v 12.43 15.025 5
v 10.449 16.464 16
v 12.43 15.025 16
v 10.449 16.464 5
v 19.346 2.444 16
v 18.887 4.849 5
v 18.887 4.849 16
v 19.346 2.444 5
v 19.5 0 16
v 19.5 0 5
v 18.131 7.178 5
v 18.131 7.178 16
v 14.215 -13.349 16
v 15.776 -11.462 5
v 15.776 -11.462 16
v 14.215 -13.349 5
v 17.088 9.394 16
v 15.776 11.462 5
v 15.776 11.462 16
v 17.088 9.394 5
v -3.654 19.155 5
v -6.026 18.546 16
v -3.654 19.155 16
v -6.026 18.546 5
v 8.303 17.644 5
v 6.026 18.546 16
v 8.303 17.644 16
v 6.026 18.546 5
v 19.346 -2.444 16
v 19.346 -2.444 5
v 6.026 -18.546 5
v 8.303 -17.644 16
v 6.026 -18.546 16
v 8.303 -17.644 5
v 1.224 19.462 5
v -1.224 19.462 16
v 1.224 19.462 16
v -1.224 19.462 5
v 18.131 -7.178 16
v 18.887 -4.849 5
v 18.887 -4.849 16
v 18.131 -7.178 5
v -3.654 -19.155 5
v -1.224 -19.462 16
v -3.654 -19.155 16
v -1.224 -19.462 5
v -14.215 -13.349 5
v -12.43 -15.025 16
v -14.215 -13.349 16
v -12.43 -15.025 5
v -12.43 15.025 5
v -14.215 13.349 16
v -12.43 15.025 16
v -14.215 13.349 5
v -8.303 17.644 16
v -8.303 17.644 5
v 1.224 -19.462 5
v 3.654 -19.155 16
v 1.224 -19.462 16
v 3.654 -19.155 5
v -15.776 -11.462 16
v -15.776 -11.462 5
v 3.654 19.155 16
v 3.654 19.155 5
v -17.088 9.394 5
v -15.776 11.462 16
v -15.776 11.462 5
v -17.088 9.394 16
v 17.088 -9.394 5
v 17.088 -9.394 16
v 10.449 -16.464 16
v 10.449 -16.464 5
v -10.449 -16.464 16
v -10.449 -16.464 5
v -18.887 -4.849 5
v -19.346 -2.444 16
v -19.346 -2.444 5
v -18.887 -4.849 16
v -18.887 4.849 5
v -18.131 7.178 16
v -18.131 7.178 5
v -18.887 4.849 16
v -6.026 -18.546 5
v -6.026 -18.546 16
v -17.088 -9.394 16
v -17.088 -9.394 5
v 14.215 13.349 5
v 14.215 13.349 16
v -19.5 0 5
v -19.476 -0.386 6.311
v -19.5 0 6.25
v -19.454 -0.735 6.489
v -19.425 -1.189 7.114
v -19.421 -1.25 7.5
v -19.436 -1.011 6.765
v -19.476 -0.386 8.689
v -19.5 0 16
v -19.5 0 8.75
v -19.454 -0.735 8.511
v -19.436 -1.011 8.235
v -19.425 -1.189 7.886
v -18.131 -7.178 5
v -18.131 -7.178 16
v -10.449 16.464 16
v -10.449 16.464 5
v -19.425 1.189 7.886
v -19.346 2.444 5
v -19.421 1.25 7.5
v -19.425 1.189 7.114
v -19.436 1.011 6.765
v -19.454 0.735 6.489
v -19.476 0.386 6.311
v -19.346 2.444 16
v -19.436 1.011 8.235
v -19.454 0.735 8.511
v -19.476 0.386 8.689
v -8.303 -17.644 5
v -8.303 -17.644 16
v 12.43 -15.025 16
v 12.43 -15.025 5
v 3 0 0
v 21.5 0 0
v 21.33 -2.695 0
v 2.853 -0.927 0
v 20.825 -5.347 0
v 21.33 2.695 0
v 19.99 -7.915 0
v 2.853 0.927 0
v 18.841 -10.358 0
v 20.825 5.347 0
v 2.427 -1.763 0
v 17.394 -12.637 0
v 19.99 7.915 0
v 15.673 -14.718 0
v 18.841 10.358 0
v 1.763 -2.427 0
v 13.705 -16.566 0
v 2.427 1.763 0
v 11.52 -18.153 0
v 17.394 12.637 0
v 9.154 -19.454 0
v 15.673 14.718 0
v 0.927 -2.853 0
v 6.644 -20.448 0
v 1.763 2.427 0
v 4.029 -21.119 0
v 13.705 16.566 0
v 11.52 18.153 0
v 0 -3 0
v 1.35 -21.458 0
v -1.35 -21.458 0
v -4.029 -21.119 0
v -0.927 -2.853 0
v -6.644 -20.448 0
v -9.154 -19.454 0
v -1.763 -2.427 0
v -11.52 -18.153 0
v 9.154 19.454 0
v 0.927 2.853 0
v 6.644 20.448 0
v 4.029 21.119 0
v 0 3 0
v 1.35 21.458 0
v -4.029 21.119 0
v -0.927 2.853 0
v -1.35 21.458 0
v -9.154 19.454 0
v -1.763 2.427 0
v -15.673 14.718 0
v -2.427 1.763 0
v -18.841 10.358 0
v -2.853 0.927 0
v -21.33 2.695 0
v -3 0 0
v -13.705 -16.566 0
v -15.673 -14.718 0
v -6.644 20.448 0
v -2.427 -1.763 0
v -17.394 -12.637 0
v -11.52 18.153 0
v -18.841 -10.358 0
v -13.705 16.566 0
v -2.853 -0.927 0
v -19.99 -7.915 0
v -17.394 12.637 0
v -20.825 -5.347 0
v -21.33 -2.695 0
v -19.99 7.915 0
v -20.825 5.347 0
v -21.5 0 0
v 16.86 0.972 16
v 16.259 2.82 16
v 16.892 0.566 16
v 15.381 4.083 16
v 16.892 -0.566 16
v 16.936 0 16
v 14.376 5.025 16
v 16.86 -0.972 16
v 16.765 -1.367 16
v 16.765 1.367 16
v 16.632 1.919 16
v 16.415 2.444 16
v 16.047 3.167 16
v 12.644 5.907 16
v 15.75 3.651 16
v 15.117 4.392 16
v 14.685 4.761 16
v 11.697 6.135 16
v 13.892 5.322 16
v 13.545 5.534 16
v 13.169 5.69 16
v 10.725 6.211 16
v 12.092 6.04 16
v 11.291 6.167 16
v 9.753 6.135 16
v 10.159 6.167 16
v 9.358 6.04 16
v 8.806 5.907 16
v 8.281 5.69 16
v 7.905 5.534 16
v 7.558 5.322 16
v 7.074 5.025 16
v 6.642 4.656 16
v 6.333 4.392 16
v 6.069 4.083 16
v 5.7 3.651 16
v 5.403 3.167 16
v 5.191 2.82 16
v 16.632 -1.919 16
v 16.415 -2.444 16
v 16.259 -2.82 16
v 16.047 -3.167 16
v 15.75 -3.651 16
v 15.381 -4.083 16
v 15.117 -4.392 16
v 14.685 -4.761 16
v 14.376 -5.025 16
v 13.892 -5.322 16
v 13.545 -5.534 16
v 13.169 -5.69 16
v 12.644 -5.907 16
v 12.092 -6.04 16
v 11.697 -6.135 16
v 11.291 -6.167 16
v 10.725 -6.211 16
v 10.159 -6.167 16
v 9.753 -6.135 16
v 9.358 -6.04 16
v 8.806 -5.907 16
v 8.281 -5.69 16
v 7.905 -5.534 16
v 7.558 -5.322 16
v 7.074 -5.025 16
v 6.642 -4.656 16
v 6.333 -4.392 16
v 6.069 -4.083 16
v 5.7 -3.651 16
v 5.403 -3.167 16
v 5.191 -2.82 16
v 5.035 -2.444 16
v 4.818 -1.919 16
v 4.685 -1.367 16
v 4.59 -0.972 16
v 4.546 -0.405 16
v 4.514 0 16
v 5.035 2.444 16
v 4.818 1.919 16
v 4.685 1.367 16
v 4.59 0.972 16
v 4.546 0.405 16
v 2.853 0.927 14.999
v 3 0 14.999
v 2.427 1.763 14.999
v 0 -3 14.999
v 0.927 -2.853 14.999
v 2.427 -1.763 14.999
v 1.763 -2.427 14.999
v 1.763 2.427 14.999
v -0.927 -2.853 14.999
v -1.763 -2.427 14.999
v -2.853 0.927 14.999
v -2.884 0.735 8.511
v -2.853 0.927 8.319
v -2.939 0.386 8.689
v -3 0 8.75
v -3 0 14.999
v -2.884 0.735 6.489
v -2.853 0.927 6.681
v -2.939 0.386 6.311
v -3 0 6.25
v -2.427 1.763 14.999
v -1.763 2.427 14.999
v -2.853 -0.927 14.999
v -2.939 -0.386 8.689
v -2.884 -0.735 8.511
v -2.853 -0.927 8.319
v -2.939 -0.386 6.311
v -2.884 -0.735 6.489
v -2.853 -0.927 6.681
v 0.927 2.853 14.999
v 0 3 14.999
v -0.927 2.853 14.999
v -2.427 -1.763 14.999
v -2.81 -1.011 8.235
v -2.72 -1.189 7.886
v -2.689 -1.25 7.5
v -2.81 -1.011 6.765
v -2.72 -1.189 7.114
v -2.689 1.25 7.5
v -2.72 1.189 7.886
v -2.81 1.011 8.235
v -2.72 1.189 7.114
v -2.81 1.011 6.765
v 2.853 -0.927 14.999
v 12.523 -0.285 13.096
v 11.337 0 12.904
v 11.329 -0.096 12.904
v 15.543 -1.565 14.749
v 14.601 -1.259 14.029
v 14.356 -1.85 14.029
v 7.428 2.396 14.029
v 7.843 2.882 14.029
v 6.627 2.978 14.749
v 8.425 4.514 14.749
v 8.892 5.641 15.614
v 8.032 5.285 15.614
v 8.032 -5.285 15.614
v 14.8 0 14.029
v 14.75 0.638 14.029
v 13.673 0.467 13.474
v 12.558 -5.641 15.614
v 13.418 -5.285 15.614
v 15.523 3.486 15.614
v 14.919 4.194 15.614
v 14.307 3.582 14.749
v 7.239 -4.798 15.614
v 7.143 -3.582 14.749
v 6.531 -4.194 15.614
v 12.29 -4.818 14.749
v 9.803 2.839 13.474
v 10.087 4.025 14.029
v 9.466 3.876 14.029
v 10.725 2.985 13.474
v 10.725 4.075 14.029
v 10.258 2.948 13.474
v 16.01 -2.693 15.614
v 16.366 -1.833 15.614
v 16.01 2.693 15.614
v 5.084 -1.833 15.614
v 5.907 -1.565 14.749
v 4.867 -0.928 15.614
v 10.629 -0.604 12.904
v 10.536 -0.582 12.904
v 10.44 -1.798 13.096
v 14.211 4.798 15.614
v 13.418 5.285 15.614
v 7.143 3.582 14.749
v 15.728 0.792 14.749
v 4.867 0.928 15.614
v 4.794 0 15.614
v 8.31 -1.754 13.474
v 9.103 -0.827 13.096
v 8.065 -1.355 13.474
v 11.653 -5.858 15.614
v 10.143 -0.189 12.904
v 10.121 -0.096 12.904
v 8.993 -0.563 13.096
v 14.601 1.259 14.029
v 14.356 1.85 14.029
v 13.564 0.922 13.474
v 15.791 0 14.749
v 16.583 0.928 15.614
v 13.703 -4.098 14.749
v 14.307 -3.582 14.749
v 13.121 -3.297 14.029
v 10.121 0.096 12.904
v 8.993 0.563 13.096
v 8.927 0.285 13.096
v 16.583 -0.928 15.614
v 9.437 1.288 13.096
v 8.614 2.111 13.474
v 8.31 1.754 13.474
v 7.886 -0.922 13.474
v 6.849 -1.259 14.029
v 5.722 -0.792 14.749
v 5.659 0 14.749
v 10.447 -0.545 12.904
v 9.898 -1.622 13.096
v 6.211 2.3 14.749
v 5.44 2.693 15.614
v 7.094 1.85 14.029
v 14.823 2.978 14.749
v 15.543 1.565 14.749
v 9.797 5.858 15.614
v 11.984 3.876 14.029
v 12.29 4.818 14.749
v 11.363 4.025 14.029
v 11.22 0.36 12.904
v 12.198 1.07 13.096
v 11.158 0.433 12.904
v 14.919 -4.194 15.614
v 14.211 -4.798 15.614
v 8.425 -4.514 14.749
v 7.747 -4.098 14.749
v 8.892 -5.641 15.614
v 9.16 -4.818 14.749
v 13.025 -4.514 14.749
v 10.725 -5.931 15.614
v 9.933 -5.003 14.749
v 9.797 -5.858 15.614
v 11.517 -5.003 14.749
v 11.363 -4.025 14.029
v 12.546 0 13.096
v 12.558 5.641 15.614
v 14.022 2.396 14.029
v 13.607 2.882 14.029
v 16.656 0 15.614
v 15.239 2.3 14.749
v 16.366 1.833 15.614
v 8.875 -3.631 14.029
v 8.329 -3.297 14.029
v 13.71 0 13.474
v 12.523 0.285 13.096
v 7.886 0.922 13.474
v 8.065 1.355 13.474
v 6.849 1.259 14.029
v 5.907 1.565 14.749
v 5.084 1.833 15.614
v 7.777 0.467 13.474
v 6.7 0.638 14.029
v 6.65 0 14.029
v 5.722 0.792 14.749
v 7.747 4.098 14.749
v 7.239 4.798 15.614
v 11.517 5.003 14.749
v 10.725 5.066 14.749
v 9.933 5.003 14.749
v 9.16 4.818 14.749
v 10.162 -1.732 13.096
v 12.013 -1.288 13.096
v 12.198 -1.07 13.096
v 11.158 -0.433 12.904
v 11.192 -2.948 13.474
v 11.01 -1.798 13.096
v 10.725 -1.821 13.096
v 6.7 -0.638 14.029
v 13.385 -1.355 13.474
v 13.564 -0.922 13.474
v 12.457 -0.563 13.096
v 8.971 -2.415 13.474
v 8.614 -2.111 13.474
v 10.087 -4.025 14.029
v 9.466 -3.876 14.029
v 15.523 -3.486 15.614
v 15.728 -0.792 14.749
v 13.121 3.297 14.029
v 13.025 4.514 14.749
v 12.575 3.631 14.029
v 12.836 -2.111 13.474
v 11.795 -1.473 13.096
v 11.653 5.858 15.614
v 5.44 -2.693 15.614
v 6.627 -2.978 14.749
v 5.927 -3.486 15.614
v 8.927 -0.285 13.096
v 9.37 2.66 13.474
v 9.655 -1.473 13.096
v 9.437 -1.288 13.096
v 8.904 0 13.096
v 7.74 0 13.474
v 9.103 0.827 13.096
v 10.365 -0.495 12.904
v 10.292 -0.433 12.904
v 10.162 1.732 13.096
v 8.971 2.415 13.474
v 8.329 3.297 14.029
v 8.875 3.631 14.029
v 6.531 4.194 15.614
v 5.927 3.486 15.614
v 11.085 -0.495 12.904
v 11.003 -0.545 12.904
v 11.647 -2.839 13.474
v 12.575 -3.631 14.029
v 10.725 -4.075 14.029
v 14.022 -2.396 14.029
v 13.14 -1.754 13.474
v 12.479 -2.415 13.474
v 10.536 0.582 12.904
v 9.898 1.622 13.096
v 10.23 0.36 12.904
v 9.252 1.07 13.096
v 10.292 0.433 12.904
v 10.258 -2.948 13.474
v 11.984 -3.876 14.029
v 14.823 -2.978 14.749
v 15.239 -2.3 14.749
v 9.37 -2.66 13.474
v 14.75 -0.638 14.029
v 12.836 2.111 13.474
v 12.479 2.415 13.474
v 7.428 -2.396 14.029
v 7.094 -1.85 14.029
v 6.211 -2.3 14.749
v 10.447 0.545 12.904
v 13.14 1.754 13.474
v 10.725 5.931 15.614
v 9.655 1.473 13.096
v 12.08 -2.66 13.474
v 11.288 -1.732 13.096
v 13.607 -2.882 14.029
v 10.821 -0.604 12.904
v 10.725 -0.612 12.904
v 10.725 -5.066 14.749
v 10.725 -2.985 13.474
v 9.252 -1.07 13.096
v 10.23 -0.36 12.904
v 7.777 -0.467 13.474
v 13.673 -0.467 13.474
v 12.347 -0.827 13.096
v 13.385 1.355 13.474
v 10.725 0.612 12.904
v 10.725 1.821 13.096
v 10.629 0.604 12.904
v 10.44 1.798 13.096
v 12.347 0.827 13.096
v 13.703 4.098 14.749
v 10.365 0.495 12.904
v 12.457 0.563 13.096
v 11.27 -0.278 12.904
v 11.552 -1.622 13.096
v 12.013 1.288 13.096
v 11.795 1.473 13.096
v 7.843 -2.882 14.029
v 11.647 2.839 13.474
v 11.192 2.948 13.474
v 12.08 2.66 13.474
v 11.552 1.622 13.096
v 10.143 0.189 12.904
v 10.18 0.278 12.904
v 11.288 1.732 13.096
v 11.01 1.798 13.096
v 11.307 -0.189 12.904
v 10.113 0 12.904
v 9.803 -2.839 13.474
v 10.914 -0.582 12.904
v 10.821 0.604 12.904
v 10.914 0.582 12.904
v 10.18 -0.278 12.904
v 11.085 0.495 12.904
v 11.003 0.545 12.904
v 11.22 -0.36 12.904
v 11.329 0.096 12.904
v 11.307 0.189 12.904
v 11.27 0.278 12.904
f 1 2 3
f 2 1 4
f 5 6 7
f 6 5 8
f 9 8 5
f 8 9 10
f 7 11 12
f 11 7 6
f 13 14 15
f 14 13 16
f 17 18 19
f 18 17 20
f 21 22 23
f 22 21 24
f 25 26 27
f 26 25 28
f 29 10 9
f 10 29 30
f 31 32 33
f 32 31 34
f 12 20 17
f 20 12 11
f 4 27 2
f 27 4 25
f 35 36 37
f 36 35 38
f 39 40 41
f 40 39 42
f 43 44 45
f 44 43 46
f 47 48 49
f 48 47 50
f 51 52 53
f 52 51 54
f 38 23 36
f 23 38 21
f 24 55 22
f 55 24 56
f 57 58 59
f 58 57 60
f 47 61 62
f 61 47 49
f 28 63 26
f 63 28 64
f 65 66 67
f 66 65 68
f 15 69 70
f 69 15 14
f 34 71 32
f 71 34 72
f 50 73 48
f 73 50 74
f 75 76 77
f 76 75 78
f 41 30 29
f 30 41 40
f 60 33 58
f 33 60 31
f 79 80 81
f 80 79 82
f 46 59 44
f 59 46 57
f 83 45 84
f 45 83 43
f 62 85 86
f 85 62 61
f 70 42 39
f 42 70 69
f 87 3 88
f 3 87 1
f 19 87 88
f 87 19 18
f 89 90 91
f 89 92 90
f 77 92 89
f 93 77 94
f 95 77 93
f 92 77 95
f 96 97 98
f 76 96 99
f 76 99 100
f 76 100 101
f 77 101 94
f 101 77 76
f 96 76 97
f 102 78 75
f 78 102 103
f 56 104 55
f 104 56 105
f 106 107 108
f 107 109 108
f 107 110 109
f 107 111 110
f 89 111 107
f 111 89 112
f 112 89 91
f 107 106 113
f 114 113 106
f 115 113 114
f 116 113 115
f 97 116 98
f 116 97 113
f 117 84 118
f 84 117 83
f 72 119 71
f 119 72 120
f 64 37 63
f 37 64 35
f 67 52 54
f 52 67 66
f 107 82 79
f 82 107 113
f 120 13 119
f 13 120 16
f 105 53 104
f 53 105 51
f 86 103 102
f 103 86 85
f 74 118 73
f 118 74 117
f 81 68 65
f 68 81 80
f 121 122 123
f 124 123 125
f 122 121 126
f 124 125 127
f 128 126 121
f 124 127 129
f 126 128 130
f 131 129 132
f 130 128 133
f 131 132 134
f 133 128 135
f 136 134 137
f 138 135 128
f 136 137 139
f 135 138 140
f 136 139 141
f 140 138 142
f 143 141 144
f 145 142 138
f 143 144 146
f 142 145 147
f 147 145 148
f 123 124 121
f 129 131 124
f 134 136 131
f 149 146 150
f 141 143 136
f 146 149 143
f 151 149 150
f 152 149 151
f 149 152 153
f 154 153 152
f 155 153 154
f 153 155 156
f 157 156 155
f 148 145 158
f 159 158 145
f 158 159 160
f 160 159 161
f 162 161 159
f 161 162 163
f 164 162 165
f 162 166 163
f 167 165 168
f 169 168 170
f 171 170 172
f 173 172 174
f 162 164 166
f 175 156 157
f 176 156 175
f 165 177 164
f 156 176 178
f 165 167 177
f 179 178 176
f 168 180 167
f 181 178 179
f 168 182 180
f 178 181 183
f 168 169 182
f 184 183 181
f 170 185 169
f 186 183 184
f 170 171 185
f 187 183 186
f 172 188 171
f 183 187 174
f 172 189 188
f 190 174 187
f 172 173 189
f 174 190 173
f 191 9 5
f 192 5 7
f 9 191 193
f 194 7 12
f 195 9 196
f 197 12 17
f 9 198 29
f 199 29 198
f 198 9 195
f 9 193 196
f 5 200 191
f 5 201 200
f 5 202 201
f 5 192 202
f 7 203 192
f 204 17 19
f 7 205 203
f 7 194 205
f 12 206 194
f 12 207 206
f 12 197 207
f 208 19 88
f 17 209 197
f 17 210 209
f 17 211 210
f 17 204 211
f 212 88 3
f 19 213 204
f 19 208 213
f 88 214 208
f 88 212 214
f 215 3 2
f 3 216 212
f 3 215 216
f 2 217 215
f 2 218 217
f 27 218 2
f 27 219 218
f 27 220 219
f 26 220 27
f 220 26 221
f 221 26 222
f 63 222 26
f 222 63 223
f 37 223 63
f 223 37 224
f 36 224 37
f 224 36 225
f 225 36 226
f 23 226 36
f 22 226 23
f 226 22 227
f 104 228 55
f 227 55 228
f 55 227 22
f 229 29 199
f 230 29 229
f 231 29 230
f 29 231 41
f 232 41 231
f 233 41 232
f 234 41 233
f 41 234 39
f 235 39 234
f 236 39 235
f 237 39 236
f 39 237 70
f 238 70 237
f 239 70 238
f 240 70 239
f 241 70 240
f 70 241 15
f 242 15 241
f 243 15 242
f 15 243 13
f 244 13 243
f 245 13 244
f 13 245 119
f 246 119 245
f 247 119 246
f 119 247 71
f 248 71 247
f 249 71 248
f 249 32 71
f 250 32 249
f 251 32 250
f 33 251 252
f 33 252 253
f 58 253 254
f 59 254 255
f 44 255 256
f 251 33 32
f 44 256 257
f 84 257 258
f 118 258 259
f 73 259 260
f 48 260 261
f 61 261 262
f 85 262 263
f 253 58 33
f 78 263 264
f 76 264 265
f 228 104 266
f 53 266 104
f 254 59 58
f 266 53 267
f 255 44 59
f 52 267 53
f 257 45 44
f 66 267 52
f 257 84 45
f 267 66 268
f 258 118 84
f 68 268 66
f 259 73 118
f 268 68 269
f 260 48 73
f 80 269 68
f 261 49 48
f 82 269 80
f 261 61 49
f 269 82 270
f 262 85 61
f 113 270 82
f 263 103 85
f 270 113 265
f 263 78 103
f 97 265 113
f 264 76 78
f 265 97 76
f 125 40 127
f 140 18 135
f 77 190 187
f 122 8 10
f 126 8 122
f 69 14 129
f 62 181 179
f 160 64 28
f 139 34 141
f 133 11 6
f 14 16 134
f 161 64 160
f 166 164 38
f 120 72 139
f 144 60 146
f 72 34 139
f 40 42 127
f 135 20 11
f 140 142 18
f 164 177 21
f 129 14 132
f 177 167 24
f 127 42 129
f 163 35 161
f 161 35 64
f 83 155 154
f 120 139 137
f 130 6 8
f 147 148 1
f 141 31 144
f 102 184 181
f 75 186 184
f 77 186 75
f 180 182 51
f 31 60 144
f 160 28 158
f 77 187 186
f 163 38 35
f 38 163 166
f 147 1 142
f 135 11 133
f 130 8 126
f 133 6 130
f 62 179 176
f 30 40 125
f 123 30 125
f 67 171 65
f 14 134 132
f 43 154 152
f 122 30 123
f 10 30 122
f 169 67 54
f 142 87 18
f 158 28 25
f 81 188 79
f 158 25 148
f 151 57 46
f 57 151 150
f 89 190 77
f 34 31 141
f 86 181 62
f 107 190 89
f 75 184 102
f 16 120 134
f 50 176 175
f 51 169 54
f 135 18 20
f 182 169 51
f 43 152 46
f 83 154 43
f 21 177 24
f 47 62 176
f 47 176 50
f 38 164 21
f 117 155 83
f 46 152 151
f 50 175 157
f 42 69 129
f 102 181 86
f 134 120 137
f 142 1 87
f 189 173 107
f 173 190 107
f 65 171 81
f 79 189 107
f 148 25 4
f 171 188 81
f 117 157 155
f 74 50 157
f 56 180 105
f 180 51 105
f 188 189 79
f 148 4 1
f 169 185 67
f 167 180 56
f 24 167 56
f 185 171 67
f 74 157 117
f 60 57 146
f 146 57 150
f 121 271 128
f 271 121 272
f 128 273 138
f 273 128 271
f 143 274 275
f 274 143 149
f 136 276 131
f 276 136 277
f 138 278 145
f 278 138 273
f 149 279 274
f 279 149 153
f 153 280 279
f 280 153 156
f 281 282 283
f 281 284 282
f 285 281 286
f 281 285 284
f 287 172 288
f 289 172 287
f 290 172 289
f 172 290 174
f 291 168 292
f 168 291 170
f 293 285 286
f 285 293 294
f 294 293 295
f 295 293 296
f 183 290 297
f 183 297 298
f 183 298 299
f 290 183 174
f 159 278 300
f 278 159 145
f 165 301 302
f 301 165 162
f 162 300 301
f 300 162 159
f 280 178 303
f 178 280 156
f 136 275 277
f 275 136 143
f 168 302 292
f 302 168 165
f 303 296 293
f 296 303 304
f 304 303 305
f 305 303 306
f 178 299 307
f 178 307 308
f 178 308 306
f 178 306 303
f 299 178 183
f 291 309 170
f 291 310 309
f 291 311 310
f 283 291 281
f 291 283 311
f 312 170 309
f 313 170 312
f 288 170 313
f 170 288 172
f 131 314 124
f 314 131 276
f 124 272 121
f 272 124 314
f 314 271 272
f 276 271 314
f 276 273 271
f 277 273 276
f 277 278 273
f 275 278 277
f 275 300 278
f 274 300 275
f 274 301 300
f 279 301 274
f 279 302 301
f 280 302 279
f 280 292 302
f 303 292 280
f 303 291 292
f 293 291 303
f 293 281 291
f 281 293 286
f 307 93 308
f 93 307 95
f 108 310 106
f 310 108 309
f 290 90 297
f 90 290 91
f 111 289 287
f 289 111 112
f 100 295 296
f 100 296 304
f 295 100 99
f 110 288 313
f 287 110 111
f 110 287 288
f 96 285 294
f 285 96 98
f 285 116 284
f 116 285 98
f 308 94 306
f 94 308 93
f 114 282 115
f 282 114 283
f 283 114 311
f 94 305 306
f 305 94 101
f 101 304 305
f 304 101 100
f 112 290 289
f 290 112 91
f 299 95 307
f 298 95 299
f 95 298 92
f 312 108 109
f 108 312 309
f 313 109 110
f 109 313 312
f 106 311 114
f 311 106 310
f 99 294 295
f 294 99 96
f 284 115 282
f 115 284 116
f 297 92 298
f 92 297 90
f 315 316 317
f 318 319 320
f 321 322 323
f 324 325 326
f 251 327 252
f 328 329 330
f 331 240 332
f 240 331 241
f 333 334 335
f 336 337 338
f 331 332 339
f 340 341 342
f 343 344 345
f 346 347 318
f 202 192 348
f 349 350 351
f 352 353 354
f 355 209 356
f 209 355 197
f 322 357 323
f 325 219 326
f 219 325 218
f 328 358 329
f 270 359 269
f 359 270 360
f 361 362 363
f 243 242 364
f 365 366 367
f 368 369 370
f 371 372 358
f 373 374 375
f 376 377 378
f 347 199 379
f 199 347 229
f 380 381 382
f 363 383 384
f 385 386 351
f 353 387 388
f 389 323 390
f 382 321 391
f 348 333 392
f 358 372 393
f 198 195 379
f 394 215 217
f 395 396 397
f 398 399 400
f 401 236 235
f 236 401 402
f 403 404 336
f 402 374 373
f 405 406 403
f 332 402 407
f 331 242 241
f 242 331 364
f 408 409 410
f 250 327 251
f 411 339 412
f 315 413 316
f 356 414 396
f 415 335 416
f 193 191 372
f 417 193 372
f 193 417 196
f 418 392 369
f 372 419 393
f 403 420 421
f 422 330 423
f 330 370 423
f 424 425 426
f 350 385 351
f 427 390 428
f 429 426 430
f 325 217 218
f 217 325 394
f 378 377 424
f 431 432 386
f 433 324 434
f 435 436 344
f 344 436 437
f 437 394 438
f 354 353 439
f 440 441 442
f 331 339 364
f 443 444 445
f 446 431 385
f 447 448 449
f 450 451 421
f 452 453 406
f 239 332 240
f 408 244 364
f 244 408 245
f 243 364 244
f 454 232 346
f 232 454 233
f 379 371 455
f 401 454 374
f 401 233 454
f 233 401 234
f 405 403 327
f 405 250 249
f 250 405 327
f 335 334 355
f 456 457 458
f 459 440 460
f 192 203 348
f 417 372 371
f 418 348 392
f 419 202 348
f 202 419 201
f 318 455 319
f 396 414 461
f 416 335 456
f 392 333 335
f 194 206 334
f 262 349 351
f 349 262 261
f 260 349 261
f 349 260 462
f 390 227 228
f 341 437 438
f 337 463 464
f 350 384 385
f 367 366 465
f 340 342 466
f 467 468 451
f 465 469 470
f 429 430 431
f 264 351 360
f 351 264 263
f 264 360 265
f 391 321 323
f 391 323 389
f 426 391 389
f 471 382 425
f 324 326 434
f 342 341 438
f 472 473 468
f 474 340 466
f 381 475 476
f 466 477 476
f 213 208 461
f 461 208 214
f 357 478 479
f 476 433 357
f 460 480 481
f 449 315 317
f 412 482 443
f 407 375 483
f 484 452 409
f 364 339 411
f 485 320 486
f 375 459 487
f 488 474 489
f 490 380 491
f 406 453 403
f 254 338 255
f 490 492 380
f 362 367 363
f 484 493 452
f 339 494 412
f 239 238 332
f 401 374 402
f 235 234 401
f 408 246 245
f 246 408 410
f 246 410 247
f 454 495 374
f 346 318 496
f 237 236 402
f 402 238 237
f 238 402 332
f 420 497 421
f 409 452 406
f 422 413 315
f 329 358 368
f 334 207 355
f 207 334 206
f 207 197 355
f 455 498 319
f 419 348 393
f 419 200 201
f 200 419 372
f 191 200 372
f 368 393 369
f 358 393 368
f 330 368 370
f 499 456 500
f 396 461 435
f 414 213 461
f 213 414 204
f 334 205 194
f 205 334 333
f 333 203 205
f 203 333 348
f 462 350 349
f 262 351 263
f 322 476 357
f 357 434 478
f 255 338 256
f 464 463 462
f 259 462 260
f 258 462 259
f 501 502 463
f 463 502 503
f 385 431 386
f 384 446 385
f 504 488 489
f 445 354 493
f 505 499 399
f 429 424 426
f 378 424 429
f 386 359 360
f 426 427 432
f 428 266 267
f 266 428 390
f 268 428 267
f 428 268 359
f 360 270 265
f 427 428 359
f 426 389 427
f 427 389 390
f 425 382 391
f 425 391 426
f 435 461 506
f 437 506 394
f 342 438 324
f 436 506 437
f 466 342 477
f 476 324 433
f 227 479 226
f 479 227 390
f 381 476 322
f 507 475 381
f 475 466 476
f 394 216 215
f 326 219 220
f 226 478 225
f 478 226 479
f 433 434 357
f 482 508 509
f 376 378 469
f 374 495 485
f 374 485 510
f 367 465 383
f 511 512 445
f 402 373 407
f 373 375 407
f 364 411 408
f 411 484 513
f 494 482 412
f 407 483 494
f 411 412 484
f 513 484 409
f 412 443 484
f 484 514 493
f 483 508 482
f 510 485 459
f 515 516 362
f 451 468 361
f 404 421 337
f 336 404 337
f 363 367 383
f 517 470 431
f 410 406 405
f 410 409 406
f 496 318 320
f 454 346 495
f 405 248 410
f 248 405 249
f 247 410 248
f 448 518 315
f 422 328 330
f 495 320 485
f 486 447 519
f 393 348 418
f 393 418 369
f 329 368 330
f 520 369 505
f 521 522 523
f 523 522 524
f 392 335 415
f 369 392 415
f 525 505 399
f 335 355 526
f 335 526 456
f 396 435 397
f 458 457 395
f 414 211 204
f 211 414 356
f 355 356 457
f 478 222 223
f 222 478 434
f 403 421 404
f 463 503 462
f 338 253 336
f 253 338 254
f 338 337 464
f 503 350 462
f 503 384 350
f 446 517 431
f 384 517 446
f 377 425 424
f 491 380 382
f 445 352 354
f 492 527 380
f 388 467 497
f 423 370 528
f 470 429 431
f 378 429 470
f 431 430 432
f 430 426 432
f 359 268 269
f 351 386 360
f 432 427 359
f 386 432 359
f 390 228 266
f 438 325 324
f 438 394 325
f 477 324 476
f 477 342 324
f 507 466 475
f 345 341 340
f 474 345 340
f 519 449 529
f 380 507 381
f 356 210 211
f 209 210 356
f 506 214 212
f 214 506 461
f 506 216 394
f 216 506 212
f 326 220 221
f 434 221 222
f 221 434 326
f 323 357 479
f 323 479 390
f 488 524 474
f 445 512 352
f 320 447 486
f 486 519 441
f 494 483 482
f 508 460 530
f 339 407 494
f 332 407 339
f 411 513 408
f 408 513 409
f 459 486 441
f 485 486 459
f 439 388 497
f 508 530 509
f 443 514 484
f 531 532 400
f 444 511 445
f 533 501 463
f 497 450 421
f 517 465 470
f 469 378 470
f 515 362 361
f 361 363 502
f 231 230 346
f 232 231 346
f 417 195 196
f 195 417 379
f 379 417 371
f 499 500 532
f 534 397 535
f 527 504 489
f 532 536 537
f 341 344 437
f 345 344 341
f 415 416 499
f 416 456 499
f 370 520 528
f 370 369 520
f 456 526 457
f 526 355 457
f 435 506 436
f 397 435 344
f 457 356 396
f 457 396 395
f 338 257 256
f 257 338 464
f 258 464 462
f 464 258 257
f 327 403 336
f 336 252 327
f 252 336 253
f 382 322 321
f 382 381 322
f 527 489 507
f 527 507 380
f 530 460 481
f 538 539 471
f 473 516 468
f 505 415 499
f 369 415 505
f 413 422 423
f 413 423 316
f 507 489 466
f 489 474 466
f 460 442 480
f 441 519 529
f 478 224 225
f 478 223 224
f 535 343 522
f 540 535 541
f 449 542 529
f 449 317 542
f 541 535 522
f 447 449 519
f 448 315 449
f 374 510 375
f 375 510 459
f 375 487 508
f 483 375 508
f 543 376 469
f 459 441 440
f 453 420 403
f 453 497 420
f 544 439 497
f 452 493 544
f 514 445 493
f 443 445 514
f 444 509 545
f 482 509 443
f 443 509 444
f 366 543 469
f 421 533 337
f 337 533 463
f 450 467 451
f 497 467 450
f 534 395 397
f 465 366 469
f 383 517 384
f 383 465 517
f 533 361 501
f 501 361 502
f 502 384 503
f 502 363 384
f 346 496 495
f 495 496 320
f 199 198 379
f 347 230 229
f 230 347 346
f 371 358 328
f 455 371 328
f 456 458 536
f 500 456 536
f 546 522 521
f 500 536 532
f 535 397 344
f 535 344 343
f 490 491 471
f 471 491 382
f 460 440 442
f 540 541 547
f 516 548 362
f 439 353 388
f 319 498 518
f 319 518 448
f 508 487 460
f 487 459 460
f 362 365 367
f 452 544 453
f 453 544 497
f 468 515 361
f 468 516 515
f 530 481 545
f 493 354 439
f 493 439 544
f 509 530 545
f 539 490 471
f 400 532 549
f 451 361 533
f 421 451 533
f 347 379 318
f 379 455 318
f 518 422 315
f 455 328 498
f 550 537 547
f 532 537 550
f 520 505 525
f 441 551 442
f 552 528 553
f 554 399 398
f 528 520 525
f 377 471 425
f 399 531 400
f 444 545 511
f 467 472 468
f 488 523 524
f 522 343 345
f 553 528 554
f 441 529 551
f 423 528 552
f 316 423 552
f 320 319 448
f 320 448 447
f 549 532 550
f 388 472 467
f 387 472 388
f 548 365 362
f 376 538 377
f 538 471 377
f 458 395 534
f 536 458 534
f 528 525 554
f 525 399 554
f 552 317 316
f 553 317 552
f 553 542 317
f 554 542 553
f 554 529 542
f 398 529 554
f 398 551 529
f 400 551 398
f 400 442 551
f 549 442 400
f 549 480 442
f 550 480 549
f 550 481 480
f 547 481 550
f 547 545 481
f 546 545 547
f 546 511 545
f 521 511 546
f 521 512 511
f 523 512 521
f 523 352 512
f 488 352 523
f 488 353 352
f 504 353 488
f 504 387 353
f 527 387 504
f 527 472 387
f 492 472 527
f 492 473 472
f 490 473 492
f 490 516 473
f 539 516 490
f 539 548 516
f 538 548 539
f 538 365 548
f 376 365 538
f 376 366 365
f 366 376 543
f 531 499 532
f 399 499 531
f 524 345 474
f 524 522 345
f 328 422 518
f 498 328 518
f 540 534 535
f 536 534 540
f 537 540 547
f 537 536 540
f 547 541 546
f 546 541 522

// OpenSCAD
$fn=1000;

//////////////////////////
// Customizable settings
//////////////////////////


// Diameter of the hole on the bottom (in mm).
HoleDiameter = 6;

// Depth of the hole in the bottom (in mm).  If you want the hole to go all the way through then set this to a number larger than the total height of the object.
HoleDepth = 15;

// If you want a D-shaped hole, set this to the thickness of the flat side (in mm).  Larger values for the flat make the hole smaller.
HoleFlatThickness = 0;

// Height (in mm).  If dome cap is selected, it is not included in height.  The shaft length is also not counted.
KnobHeight = 16;

// Diameter of base of round part of knob (in mm).  (Knurled ridges are not included in this measurement.)
KnobDiameter = 39;

// Shape of top of knob.  "Recessed" type can be painted.
CapType = 0;	// [0:Flat, 1:Recessed, 2:Dome]

// Do you want a large timer-knob style pointer?
TimerKnob=0;	// [0:No, 1:Yes]

// Would you like a divot on the top to indicate direction?
Pointer1 = 1;	// [0:No, 1:Yes]

// Would you like a line (pointer) on the front to indicate direction?
Pointer2 = 0;	// [0:No, 1:Yes]

// Do you want finger ridges around the knob?
Knurled = 0;	// [0:No, 1:Yes]

// 0 = A cylindrical knob, any other value will taper the knob.
TaperPercentage = 0;		// [0:0%, 10:10%, 20:20%, 30:30%, 40:40%, 50:50%]

// Width of "dial" ring (in mm).  Set to zero if you don't want the ring.
RingWidth = 2;

// The number of markings on the dial.  Set to zero if you don't want markings.  (RingWidth must be non-zero.)
RingMarkings = 0;

// diameter of the hole for the setscrew (in mm).  If you don't need a hole, set this to zero.
ScrewHoleDiameter = 2.5;

// Length of the shaft on the bottom of the knob (in mm).  If you don't want a shaft, set this value to zero.
ShaftLength = 0;

// Diameter of the shaft on the bottom of the knob (in mm).  (ShaftLength must be non-zero.)
ShaftDiameter = 10;

// Would you like a notch in the shaft?  It can be used for a press-on type knob (rather than using a setscrew).  (ShaftLength must be non-zero.)
NotchedShaft = 1;	// [0:No, 1:Yes]



//////////////////////////
//Advanced settings
//////////////////////////

RingThickness = 5*1;
DivotDepth = 1.5*1;
MarkingWidth = 1.5*1;
DistanceBetweenKnurls = 3*1;
TimerKnobConst = 1.8*1;



//////////////////////////
//Calculations
//////////////////////////

PI=3.14159265*1;
KnobMajorRadius = KnobDiameter/2;
KnobMinorRadius = KnobDiameter/2 * (1 - TaperPercentage/100);
KnobRadius = KnobMinorRadius + (KnobMajorRadius-KnobMinorRadius)/2;
KnobCircumference = PI*KnobDiameter;
Knurls = round(KnobCircumference/DistanceBetweenKnurls);
Divot=CapType;

TaperAngle=asin(KnobHeight / (sqrt(pow(KnobHeight, 2) +
		pow(KnobMajorRadius-KnobMinorRadius,2)))) - 90;

DivotRadius = KnobMinorRadius*.4;


union()
{
translate([0, 0, (ShaftLength==0)? 0 : ShaftLength-0.001])
difference()
{
union()
{
	// Primary knob cylinder
	cylinder(h=KnobHeight, r1=KnobMajorRadius, r2=KnobMinorRadius,
			$fn=50);
	
	if (Knurled)
		for (i=[0 : Knurls-1])
			rotate([0, 0, i * (360/Knurls)])
				translate([KnobRadius, 0, KnobHeight/2])
					rotate([0, TaperAngle, 0]) rotate([0, 0, 45])
						cube([2, 2, KnobHeight+.001], center=true);

 	if (RingMarkings>0)
		for (i=[0 : RingMarkings-1])
			rotate([0, 0, i * (360/RingMarkings)])
				translate([KnobMajorRadius + RingWidth/2, 0, 1])
					cube([RingWidth*.5, MarkingWidth, 2], center=true);		
	
	if (Pointer2==1)
		translate([KnobRadius, 0, KnobHeight/2-2])
			rotate([0, TaperAngle, 0])
				cube([8, 3, KnobHeight], center=true);		

	if (RingWidth>0)
		translate([0, 0, RingThickness/2])
			cylinder(r1=KnobMajorRadius + RingWidth, r2=KnobMinorRadius,
					h=RingThickness, $fn=50, center=true);

	if (Divot==2)
		translate([0, 0, KnobHeight])
			difference()
			{
				scale([1, 1, 0.5])
					sphere(r=KnobMinorRadius, $fn=50, center=true);

				translate([0, 0, 0-(KnobMinorRadius+.001)])
					cube([KnobMinorRadius*2.5, KnobMinorRadius*2.5,
							KnobMinorRadius*2], center=true);
			}

	if (TimerKnob==1) intersection()
		{
			translate([0, 0, 0-(KnobDiameter*TimerKnobConst) + KnobHeight])
			sphere(r=KnobDiameter*TimerKnobConst, $fn=50, center=true);		
	
			translate([0-(KnobDiameter*TimerKnobConst)*0.1, 0,
					KnobHeight/2])
				scale([1, 0.5, 1])
					cylinder(h=KnobHeight, r=(KnobDiameter*TimerKnobConst) *
							0.8, $fn=3, center=true);
		}
}

// Pointer1: Offset hemispherical divot
if (Pointer1==1)
	translate([KnobMinorRadius*.55, 0, KnobHeight + DivotRadius*.6])
		sphere(r=DivotRadius, $fn=40);

// Divot1: Centered cylynrical divot
if (Divot==1)
	translate([0, 0, KnobHeight])
		cylinder(h=DivotDepth*2, r=KnobMinorRadius-1.5, $fn=50,
				center=true);

if (ShaftLength==0)
{
	// Hole for shaft
	translate([0, 0, HoleDepth/2 - 0.001])
		difference()
		{
			cylinder(r=HoleDiameter/2, h=HoleDepth, $fn=20,
					center=true);
	
			// Flat for D-shaped hole
			translate([(0-HoleDiameter)+HoleFlatThickness, 0, 0])
				cube([HoleDiameter, HoleDiameter, HoleDepth+.001],
						center=true);
		}
	
	// Hole for setscrew
	if (ScrewHoleDiameter>0)
		translate([0 - (KnobMajorRadius+RingWidth+1)/2, 0,
				HoleDepth/2])
			rotate([0, 90, 0])
			cylinder(h=(KnobMajorRadius+RingWidth+1),
					r=ScrewHoleDiameter/2, $fn=20, center=true);
}

// Make sure bottom ends at z=0
translate([0, 0, -10])
	cube([(KnobMajorRadius+RingWidth) * 3,
			(KnobMajorRadius+RingWidth) * 3, 20], center=true);
}

if (ShaftLength>0)
	difference()
	{
		translate([0, 0, ShaftLength/2])
			cylinder(h=ShaftLength, r=ShaftDiameter/2, $fn=20,
					center=true);

		if (NotchedShaft==1)
		{
			cube([HoleDiameter/2, ShaftDiameter*2, ShaftLength],
					center=true);
		}

		// Hole for shaft
		translate([0, 0, HoleDepth/2 - 0.001])
			difference()
			{
				cylinder(r=HoleDiameter/2, h=HoleDepth, $fn=20,
						center=true);
		
				// Flat for D-shaped hole
				translate([(0-HoleDiameter)+HoleFlatThickness, 0, 0])
					cube([HoleDiameter, HoleDiameter, HoleDepth+.001],
							center=true);
			}
		
		// Hole for setscrew
		if (ScrewHoleDiameter>0)
			translate([0 - (KnobMajorRadius+RingWidth+1)/2, 0,
					HoleDepth/2])
				rotate([0, 90, 0])
				cylinder(h=(KnobMajorRadius+RingWidth+1),
						r=ScrewHoleDiameter/2, $fn=20, center=true);
	}
}
